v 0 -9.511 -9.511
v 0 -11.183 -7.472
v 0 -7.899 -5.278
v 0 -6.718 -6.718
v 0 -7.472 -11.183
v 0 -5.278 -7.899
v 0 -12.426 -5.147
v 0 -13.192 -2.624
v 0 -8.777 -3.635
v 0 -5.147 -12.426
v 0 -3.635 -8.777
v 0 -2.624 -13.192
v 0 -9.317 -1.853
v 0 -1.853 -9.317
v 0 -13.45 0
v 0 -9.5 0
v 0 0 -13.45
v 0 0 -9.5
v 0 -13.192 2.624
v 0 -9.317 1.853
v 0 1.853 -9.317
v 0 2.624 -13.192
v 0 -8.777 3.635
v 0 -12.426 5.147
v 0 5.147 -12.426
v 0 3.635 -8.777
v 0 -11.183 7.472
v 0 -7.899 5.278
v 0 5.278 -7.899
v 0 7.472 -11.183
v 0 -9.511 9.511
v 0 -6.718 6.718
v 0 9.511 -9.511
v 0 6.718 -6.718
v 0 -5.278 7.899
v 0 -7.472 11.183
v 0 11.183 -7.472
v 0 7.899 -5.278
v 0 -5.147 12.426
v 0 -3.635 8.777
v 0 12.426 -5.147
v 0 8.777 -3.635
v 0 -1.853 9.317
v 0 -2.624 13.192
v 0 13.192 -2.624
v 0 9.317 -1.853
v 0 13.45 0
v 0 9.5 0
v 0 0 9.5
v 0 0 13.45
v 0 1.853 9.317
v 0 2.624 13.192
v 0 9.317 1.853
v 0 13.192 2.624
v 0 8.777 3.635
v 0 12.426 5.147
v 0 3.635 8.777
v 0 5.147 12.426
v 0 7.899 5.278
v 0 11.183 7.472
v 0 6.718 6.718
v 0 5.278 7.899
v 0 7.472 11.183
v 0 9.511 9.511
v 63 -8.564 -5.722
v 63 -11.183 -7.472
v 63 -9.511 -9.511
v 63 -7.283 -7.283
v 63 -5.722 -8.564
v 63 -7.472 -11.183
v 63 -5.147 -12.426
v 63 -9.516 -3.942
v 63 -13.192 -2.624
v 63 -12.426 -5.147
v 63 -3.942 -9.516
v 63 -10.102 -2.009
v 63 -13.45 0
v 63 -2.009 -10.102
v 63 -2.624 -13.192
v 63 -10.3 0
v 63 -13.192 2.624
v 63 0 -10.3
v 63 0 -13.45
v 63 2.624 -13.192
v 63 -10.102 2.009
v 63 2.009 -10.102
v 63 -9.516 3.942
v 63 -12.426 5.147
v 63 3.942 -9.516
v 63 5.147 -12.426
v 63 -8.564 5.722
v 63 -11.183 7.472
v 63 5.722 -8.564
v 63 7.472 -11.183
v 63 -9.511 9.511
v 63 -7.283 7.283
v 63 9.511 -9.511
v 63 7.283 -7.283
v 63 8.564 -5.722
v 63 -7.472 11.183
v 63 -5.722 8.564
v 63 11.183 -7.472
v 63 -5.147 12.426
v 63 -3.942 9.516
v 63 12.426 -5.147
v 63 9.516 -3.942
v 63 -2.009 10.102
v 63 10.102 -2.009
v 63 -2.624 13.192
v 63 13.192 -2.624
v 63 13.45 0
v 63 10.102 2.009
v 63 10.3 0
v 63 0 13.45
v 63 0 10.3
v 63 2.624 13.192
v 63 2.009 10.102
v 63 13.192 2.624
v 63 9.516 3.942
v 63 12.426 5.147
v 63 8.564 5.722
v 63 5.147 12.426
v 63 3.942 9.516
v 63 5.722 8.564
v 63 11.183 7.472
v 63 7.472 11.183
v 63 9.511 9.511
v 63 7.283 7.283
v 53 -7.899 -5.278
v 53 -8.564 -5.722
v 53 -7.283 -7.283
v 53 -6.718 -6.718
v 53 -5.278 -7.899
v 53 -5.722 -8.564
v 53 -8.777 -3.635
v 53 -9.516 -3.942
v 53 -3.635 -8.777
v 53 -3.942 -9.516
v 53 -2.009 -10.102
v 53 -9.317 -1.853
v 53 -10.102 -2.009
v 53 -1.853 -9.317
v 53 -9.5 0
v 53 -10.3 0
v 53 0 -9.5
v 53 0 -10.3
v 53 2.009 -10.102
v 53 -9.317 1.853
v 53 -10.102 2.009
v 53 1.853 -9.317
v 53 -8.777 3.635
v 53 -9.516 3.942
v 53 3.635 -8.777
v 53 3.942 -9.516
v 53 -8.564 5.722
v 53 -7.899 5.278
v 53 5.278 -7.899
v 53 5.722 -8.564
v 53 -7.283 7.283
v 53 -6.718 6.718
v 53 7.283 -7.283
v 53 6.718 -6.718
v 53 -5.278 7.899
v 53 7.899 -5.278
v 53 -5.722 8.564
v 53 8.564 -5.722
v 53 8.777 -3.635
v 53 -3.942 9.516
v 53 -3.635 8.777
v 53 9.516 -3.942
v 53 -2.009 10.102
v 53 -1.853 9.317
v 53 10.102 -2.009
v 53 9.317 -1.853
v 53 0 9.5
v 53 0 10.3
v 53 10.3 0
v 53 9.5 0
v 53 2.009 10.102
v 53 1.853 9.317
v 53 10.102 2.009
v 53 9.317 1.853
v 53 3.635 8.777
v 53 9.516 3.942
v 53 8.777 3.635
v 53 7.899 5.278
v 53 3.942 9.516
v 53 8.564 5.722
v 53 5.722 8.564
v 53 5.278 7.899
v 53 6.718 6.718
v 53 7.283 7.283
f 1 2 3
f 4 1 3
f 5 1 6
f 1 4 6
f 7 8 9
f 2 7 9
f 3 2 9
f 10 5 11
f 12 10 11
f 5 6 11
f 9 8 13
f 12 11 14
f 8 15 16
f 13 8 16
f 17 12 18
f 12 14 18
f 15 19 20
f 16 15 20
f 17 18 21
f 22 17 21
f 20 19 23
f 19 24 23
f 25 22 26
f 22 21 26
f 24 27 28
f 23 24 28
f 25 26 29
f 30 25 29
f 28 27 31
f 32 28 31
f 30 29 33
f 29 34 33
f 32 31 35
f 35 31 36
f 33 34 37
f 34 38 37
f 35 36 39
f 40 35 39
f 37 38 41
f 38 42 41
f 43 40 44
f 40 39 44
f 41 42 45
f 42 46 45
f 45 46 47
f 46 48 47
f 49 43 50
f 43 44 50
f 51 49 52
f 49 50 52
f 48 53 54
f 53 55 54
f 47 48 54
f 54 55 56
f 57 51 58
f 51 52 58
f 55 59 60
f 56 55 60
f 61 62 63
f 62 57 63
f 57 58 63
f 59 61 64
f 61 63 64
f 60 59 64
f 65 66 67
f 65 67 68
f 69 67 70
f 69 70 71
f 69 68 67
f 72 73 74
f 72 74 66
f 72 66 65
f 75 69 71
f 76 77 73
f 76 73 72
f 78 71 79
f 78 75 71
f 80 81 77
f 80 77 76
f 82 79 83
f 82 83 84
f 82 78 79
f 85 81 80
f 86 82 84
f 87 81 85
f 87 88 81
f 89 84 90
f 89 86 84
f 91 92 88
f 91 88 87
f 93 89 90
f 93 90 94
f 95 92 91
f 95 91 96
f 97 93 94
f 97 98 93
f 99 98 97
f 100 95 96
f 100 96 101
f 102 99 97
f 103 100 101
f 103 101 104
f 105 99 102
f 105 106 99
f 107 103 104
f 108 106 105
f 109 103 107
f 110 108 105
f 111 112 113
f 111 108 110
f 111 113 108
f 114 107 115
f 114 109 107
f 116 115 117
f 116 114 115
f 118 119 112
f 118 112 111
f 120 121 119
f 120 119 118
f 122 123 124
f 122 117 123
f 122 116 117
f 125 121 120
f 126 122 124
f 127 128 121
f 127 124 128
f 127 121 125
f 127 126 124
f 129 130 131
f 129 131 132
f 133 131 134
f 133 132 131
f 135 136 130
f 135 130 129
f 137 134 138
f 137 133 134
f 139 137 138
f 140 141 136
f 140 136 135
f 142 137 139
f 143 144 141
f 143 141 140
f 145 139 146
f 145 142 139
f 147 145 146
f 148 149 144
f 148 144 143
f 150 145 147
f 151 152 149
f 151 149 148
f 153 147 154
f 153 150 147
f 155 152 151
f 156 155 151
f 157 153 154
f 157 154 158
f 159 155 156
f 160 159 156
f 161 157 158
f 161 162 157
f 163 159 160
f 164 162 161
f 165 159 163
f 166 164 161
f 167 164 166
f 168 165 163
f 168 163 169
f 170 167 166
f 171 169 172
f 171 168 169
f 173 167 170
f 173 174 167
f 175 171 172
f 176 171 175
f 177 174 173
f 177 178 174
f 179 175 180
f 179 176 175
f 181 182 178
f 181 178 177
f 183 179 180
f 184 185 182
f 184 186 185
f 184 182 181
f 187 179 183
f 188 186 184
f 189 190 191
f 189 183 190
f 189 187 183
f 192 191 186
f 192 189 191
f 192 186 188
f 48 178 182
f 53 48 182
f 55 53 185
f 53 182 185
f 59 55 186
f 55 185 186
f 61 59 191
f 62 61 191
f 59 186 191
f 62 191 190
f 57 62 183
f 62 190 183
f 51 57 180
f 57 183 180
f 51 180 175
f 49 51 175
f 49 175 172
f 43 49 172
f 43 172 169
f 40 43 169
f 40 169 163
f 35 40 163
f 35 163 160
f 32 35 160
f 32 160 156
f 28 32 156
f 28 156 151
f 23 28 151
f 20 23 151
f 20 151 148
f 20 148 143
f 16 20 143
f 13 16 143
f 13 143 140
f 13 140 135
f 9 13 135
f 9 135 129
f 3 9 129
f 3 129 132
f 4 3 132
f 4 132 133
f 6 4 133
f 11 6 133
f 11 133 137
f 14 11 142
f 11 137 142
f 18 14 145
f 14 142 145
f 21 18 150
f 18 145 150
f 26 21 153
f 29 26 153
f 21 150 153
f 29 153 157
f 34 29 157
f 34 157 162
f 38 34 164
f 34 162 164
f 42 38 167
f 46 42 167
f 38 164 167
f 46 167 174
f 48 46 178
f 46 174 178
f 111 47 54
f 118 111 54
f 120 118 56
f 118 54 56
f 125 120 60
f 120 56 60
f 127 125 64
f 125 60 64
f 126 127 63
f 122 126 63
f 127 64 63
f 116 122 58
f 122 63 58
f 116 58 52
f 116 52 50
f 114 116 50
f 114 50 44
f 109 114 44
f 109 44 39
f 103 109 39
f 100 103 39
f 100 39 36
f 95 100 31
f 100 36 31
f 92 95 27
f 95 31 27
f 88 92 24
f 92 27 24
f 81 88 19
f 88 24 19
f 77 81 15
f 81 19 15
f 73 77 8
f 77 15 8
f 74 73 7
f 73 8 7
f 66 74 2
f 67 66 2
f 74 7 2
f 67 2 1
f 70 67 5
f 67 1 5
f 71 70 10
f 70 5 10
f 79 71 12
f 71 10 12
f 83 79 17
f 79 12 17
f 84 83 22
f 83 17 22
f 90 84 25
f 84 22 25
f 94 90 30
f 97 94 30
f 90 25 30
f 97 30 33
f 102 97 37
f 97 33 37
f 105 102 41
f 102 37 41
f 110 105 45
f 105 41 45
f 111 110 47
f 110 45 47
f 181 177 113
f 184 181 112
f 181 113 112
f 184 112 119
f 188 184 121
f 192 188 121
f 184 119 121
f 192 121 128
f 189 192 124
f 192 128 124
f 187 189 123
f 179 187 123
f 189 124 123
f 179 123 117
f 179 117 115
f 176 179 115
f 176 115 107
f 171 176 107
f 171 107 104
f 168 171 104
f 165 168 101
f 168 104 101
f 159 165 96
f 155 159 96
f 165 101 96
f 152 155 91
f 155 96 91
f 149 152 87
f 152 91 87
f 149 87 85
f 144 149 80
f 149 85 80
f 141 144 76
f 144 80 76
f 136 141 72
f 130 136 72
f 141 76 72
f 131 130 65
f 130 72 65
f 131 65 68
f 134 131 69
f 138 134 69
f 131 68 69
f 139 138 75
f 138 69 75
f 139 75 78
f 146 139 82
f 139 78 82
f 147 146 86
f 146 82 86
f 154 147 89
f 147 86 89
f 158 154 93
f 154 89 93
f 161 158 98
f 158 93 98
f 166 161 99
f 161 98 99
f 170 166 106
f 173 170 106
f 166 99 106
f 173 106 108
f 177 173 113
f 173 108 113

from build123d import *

# Parameters (mm, degrees)
F0_R     = 13.45
F1_DEPTH = 63
F2_R     = 9.5
F3_DEPTH = 63.001
F4_R     = 10.3
F5_DEPTH = 10


with BuildPart() as f1:
    # F0 (on Right) → F1 (new body)
    with BuildSketch(Plane.YZ):
        Circle(F0_R)
    extrude(amount=F1_DEPTH)

    # F2 (on face) → F3 (cut, through all)
    with BuildSketch(Plane.YZ.offset(63)):
        Circle(F2_R)
    extrude(amount=-F3_DEPTH, mode=Mode.SUBTRACT)

    # F4 (on face) → F5 (cut)
    with BuildSketch(Plane.YZ.offset(63)):
        Circle(F4_R)
    extrude(amount=-F5_DEPTH, mode=Mode.SUBTRACT)


solid = f1.part
